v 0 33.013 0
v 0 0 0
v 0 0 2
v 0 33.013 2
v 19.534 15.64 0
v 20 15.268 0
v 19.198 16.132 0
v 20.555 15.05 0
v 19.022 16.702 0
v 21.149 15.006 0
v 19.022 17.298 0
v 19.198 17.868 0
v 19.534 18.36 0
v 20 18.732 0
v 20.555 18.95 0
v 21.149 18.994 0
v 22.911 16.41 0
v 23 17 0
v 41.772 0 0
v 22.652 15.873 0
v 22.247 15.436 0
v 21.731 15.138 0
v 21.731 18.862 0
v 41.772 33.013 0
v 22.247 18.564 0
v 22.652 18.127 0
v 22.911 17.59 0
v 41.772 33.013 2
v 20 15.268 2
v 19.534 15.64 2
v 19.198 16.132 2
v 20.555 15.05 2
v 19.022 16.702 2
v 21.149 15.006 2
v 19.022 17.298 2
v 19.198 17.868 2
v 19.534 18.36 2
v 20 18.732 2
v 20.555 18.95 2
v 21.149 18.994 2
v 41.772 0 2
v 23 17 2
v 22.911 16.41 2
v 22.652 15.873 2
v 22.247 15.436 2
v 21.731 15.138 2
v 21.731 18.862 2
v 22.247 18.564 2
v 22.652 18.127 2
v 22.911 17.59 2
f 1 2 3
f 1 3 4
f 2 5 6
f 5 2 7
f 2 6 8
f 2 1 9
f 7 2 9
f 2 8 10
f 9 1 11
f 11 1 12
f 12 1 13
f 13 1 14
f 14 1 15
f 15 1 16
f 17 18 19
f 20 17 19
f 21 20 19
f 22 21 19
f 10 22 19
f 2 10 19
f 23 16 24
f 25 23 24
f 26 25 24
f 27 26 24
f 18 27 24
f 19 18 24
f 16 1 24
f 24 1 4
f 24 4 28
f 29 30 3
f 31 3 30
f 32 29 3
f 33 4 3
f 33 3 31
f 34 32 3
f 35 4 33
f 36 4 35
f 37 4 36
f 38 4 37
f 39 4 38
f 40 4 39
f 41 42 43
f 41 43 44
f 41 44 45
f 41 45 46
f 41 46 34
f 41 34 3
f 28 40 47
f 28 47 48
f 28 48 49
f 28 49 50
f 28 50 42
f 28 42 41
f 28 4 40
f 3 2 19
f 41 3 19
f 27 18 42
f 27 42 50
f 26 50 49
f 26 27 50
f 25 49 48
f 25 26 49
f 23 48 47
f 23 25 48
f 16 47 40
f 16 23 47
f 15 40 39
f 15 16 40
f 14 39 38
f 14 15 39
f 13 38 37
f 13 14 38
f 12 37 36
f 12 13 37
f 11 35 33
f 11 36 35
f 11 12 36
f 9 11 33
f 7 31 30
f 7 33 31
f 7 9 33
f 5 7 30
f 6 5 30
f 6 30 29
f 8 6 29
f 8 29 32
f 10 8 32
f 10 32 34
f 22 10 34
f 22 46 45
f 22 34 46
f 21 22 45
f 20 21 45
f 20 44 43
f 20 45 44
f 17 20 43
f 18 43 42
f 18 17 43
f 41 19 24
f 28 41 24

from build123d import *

# Parameters (mm, degrees)
CYLINDER_R     = 2
CYLINDER_DEPTH = 10
SKETCH_W       = 41.771851
SKETCH_H       = 33.013145
EXTRUDE_DEPTH  = 2


with BuildPart() as cilindro:
    # Cylinder → Cylinder (new body)
    with BuildSketch(Plane(origin=(21, 17, -4), x_dir=(1, 0, 0), z_dir=(0, 0, 1))):
        Circle(CYLINDER_R)
    extrude(amount=CYLINDER_DEPTH)


with BuildPart() as cut:
    # Sketch → Extrude (new body)
    with BuildSketch(Plane.XY):
        with Locations((20.885925, 16.506573)):
            Rectangle(SKETCH_W, SKETCH_H)
    extrude(amount=EXTRUDE_DEPTH)

    # Cut: cut Cilindro
    add(cilindro.part, mode=Mode.SUBTRACT)


solid = cut.part
